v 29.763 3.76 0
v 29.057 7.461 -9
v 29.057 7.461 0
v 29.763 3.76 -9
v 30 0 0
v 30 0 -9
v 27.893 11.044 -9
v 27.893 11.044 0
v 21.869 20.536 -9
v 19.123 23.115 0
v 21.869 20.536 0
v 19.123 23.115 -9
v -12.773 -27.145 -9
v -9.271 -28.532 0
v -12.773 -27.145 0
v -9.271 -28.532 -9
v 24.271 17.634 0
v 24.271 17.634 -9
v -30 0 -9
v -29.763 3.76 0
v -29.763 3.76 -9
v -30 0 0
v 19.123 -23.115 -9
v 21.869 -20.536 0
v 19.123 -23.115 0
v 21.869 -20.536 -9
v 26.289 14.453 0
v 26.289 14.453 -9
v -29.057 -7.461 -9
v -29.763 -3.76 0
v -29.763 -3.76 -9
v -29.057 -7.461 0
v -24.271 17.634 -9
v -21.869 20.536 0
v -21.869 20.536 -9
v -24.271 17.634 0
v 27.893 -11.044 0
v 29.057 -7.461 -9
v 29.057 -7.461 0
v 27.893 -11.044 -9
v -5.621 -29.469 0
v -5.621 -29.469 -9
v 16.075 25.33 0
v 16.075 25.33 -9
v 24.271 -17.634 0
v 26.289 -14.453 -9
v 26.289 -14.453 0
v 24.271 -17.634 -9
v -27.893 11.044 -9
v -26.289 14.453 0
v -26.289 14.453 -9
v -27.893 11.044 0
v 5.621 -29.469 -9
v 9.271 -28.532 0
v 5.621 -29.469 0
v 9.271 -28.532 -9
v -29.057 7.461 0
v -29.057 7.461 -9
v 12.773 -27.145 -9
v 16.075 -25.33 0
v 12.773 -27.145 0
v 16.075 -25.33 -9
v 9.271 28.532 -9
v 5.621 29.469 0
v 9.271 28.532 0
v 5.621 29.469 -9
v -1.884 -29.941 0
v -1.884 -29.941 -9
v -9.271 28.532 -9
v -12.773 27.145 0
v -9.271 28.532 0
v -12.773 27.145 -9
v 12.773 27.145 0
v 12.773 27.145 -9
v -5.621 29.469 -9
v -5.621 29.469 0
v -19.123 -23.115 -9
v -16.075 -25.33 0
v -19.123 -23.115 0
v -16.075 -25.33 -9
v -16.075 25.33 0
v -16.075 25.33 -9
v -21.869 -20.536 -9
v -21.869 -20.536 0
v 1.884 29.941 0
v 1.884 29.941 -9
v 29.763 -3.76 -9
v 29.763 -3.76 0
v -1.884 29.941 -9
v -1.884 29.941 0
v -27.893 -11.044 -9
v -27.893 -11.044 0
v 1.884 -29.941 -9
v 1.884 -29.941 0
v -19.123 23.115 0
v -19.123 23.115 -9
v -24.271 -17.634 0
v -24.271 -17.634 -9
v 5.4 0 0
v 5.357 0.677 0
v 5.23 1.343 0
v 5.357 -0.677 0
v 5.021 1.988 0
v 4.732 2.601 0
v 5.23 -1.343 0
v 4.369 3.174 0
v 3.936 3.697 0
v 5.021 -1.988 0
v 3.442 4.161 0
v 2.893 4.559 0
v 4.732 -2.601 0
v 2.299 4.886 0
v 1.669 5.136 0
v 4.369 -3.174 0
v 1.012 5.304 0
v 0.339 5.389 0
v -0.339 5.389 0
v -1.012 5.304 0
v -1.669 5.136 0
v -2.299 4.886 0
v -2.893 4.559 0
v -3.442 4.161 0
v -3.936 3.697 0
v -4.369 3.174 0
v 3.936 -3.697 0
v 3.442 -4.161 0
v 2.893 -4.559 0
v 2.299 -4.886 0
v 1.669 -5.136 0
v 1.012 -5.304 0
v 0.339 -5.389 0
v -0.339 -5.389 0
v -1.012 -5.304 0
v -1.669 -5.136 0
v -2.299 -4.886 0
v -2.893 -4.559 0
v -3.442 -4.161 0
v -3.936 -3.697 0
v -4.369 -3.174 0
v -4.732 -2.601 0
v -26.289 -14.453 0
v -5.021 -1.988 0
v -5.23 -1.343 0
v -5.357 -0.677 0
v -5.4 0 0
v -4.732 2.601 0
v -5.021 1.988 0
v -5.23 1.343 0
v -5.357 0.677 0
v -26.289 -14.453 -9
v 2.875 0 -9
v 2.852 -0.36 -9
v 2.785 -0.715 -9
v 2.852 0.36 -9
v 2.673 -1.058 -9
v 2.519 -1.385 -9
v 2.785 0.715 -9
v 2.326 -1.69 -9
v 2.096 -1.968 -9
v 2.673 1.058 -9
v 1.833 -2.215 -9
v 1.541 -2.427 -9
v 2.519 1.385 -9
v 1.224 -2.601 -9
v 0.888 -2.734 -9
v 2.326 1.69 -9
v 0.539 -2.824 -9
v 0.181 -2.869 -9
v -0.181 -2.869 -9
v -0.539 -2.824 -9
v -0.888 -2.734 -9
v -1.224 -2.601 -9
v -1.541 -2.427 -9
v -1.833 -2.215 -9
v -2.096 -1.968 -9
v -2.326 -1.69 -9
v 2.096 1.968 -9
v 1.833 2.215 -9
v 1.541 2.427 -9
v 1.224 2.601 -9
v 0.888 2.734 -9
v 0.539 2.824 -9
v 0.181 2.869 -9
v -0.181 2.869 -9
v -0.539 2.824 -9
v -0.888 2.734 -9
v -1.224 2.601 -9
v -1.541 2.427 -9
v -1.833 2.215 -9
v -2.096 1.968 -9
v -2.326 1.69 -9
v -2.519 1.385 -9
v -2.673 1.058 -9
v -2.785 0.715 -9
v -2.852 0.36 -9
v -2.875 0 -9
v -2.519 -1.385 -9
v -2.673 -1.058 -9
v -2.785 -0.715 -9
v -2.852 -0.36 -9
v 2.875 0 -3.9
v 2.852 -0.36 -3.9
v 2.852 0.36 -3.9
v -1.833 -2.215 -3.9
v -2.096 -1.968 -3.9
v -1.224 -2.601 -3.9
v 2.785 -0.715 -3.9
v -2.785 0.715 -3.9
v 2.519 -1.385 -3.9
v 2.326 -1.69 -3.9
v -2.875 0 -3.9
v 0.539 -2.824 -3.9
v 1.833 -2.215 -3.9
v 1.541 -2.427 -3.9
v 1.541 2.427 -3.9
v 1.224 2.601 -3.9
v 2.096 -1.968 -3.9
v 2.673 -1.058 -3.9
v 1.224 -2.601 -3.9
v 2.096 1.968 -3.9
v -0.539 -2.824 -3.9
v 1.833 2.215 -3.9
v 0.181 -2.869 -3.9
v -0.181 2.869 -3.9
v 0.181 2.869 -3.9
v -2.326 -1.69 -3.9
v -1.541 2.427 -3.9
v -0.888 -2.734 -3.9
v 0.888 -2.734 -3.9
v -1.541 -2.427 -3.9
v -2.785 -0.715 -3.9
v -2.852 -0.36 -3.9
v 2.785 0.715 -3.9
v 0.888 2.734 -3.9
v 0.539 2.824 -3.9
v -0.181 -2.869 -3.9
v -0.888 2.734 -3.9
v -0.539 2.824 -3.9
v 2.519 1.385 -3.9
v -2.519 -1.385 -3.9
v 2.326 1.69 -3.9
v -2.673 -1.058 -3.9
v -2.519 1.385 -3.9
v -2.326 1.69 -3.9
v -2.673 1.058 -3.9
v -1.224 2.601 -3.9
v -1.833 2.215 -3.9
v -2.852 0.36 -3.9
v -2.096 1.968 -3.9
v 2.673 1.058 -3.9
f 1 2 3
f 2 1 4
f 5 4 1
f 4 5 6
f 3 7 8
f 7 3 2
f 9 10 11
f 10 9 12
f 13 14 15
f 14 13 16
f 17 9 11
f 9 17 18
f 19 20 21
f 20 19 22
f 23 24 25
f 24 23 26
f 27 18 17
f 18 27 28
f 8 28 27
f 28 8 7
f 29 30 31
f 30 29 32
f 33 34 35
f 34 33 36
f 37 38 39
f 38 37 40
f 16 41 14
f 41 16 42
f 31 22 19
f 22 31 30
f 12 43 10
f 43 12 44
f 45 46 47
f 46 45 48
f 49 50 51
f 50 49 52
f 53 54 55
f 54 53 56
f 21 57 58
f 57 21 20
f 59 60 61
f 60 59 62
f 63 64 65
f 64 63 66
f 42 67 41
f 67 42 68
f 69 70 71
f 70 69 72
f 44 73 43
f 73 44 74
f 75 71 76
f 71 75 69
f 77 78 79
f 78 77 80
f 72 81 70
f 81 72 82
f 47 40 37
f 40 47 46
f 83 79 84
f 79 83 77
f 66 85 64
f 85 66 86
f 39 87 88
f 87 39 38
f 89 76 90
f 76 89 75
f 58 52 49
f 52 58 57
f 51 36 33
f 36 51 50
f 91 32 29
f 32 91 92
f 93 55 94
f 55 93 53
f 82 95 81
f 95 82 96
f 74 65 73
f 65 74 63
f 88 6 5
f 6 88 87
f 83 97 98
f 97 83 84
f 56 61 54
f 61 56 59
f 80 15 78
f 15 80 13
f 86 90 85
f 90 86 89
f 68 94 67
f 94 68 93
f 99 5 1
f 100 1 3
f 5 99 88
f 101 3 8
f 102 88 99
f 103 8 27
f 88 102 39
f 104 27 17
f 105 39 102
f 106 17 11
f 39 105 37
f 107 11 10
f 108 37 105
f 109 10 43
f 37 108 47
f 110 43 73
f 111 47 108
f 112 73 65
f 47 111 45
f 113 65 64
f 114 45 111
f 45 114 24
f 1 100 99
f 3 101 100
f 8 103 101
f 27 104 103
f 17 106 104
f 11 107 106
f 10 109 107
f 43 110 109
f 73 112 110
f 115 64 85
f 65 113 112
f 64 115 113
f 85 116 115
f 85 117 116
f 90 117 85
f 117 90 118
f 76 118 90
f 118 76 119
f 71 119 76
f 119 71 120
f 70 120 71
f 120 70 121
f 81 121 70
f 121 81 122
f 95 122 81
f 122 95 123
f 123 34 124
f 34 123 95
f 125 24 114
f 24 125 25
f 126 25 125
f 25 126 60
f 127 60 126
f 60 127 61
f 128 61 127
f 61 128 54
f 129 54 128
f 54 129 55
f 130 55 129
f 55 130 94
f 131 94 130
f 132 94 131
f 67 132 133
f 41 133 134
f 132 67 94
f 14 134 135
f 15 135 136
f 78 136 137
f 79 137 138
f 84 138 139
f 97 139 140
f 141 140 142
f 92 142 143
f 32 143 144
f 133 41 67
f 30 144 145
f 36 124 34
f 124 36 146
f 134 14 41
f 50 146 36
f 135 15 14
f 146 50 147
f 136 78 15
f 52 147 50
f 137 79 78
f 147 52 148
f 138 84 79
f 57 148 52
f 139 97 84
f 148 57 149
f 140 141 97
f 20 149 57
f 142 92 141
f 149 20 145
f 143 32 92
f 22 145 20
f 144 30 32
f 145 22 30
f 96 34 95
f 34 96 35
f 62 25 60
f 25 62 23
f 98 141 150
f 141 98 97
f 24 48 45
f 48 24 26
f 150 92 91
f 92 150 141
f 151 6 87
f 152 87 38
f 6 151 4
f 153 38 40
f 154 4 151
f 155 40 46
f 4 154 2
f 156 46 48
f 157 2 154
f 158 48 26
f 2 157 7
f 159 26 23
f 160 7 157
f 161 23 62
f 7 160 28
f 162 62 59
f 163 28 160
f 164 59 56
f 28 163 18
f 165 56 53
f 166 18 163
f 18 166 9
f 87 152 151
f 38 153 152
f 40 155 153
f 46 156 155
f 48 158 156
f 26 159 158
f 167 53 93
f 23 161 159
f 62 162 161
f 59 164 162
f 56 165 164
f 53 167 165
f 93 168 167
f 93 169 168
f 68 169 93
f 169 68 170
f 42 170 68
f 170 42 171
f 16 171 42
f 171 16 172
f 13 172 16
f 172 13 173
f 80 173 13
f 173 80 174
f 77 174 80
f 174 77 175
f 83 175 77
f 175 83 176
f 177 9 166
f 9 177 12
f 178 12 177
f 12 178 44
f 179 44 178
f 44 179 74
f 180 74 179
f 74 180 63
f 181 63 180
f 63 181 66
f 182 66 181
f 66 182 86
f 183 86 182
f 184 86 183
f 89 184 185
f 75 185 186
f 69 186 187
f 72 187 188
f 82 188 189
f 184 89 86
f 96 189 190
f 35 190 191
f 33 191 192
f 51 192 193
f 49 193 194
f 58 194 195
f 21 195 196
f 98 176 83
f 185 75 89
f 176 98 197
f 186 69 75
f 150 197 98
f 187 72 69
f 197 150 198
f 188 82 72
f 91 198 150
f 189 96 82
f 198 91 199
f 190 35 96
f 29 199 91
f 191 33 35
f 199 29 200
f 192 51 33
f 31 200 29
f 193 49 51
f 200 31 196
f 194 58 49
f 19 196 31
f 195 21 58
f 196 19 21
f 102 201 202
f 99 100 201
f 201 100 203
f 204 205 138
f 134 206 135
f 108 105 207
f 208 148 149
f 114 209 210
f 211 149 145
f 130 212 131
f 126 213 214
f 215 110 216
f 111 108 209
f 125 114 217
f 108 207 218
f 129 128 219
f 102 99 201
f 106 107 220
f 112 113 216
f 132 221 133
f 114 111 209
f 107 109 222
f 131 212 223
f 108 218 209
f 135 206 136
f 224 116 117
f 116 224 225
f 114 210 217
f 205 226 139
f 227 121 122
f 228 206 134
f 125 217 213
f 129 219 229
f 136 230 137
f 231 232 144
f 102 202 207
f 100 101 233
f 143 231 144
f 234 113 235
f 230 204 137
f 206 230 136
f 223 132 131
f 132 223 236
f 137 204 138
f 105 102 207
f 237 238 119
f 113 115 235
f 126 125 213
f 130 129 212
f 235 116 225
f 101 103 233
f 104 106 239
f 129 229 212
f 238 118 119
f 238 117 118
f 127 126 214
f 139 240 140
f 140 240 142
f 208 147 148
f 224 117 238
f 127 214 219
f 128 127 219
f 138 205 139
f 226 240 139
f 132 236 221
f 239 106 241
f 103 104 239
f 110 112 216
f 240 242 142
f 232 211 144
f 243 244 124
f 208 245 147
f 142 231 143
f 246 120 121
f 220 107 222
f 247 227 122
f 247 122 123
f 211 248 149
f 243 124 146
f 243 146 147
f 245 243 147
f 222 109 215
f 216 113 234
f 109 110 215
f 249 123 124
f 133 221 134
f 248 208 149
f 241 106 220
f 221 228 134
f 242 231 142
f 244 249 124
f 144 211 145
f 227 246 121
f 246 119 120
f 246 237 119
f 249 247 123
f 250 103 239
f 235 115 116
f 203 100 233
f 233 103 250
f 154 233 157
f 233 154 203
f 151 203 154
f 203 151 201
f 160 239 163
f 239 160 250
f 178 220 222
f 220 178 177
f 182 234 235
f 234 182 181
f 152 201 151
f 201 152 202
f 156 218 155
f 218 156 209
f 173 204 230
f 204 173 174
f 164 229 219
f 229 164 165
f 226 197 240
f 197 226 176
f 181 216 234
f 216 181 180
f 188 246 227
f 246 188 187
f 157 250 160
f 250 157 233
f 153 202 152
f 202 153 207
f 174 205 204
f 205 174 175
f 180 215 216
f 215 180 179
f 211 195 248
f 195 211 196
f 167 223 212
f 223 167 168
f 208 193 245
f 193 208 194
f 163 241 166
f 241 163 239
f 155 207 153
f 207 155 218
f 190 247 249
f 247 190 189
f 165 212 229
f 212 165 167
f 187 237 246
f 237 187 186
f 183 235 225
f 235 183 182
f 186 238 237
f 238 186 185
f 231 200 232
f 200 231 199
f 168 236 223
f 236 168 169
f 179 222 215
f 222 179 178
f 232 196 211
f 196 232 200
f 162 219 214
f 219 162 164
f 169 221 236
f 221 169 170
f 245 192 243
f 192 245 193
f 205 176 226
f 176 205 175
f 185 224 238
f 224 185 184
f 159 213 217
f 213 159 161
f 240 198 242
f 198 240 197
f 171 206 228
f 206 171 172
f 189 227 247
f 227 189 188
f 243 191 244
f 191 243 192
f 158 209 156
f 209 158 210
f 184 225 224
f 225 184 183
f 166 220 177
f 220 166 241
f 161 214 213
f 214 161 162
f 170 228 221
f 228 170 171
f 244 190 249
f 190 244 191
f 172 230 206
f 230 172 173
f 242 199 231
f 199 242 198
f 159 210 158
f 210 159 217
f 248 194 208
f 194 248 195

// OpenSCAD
$fn = 50;


difference() {
	union() {
		translate(v = [0, 0, -9.0000000000]) {
			cylinder(h = 9, r = 30.0000000000);
		}
		translate(v = [0, 0, -9.0000000000]) {
			cylinder(h = 9, r = 2.8750000000);
		}
	}
	union() {
		translate(v = [0, 0, 0]) {
			rotate(a = [0, 0, 0]) {
				difference() {
					union() {
						#translate(v = [0, 0, -9.0000000000]) {
							cylinder(h = 9, r = 2.6000000000);
						}
						#translate(v = [0, 0, -3.9000000000]) {
							cylinder(h = 3.9000000000, r1 = 2.8750000000, r2 = 5.4000000000);
						}
						#translate(v = [0, 0, -9.0000000000]) {
							cylinder(h = 9, r = 2.8750000000);
						}
						#translate(v = [0, 0, -9.0000000000]) {
							cylinder(h = 9, r = 2.6000000000);
						}
					}
					union();
				}
			}
		}
	}
}
